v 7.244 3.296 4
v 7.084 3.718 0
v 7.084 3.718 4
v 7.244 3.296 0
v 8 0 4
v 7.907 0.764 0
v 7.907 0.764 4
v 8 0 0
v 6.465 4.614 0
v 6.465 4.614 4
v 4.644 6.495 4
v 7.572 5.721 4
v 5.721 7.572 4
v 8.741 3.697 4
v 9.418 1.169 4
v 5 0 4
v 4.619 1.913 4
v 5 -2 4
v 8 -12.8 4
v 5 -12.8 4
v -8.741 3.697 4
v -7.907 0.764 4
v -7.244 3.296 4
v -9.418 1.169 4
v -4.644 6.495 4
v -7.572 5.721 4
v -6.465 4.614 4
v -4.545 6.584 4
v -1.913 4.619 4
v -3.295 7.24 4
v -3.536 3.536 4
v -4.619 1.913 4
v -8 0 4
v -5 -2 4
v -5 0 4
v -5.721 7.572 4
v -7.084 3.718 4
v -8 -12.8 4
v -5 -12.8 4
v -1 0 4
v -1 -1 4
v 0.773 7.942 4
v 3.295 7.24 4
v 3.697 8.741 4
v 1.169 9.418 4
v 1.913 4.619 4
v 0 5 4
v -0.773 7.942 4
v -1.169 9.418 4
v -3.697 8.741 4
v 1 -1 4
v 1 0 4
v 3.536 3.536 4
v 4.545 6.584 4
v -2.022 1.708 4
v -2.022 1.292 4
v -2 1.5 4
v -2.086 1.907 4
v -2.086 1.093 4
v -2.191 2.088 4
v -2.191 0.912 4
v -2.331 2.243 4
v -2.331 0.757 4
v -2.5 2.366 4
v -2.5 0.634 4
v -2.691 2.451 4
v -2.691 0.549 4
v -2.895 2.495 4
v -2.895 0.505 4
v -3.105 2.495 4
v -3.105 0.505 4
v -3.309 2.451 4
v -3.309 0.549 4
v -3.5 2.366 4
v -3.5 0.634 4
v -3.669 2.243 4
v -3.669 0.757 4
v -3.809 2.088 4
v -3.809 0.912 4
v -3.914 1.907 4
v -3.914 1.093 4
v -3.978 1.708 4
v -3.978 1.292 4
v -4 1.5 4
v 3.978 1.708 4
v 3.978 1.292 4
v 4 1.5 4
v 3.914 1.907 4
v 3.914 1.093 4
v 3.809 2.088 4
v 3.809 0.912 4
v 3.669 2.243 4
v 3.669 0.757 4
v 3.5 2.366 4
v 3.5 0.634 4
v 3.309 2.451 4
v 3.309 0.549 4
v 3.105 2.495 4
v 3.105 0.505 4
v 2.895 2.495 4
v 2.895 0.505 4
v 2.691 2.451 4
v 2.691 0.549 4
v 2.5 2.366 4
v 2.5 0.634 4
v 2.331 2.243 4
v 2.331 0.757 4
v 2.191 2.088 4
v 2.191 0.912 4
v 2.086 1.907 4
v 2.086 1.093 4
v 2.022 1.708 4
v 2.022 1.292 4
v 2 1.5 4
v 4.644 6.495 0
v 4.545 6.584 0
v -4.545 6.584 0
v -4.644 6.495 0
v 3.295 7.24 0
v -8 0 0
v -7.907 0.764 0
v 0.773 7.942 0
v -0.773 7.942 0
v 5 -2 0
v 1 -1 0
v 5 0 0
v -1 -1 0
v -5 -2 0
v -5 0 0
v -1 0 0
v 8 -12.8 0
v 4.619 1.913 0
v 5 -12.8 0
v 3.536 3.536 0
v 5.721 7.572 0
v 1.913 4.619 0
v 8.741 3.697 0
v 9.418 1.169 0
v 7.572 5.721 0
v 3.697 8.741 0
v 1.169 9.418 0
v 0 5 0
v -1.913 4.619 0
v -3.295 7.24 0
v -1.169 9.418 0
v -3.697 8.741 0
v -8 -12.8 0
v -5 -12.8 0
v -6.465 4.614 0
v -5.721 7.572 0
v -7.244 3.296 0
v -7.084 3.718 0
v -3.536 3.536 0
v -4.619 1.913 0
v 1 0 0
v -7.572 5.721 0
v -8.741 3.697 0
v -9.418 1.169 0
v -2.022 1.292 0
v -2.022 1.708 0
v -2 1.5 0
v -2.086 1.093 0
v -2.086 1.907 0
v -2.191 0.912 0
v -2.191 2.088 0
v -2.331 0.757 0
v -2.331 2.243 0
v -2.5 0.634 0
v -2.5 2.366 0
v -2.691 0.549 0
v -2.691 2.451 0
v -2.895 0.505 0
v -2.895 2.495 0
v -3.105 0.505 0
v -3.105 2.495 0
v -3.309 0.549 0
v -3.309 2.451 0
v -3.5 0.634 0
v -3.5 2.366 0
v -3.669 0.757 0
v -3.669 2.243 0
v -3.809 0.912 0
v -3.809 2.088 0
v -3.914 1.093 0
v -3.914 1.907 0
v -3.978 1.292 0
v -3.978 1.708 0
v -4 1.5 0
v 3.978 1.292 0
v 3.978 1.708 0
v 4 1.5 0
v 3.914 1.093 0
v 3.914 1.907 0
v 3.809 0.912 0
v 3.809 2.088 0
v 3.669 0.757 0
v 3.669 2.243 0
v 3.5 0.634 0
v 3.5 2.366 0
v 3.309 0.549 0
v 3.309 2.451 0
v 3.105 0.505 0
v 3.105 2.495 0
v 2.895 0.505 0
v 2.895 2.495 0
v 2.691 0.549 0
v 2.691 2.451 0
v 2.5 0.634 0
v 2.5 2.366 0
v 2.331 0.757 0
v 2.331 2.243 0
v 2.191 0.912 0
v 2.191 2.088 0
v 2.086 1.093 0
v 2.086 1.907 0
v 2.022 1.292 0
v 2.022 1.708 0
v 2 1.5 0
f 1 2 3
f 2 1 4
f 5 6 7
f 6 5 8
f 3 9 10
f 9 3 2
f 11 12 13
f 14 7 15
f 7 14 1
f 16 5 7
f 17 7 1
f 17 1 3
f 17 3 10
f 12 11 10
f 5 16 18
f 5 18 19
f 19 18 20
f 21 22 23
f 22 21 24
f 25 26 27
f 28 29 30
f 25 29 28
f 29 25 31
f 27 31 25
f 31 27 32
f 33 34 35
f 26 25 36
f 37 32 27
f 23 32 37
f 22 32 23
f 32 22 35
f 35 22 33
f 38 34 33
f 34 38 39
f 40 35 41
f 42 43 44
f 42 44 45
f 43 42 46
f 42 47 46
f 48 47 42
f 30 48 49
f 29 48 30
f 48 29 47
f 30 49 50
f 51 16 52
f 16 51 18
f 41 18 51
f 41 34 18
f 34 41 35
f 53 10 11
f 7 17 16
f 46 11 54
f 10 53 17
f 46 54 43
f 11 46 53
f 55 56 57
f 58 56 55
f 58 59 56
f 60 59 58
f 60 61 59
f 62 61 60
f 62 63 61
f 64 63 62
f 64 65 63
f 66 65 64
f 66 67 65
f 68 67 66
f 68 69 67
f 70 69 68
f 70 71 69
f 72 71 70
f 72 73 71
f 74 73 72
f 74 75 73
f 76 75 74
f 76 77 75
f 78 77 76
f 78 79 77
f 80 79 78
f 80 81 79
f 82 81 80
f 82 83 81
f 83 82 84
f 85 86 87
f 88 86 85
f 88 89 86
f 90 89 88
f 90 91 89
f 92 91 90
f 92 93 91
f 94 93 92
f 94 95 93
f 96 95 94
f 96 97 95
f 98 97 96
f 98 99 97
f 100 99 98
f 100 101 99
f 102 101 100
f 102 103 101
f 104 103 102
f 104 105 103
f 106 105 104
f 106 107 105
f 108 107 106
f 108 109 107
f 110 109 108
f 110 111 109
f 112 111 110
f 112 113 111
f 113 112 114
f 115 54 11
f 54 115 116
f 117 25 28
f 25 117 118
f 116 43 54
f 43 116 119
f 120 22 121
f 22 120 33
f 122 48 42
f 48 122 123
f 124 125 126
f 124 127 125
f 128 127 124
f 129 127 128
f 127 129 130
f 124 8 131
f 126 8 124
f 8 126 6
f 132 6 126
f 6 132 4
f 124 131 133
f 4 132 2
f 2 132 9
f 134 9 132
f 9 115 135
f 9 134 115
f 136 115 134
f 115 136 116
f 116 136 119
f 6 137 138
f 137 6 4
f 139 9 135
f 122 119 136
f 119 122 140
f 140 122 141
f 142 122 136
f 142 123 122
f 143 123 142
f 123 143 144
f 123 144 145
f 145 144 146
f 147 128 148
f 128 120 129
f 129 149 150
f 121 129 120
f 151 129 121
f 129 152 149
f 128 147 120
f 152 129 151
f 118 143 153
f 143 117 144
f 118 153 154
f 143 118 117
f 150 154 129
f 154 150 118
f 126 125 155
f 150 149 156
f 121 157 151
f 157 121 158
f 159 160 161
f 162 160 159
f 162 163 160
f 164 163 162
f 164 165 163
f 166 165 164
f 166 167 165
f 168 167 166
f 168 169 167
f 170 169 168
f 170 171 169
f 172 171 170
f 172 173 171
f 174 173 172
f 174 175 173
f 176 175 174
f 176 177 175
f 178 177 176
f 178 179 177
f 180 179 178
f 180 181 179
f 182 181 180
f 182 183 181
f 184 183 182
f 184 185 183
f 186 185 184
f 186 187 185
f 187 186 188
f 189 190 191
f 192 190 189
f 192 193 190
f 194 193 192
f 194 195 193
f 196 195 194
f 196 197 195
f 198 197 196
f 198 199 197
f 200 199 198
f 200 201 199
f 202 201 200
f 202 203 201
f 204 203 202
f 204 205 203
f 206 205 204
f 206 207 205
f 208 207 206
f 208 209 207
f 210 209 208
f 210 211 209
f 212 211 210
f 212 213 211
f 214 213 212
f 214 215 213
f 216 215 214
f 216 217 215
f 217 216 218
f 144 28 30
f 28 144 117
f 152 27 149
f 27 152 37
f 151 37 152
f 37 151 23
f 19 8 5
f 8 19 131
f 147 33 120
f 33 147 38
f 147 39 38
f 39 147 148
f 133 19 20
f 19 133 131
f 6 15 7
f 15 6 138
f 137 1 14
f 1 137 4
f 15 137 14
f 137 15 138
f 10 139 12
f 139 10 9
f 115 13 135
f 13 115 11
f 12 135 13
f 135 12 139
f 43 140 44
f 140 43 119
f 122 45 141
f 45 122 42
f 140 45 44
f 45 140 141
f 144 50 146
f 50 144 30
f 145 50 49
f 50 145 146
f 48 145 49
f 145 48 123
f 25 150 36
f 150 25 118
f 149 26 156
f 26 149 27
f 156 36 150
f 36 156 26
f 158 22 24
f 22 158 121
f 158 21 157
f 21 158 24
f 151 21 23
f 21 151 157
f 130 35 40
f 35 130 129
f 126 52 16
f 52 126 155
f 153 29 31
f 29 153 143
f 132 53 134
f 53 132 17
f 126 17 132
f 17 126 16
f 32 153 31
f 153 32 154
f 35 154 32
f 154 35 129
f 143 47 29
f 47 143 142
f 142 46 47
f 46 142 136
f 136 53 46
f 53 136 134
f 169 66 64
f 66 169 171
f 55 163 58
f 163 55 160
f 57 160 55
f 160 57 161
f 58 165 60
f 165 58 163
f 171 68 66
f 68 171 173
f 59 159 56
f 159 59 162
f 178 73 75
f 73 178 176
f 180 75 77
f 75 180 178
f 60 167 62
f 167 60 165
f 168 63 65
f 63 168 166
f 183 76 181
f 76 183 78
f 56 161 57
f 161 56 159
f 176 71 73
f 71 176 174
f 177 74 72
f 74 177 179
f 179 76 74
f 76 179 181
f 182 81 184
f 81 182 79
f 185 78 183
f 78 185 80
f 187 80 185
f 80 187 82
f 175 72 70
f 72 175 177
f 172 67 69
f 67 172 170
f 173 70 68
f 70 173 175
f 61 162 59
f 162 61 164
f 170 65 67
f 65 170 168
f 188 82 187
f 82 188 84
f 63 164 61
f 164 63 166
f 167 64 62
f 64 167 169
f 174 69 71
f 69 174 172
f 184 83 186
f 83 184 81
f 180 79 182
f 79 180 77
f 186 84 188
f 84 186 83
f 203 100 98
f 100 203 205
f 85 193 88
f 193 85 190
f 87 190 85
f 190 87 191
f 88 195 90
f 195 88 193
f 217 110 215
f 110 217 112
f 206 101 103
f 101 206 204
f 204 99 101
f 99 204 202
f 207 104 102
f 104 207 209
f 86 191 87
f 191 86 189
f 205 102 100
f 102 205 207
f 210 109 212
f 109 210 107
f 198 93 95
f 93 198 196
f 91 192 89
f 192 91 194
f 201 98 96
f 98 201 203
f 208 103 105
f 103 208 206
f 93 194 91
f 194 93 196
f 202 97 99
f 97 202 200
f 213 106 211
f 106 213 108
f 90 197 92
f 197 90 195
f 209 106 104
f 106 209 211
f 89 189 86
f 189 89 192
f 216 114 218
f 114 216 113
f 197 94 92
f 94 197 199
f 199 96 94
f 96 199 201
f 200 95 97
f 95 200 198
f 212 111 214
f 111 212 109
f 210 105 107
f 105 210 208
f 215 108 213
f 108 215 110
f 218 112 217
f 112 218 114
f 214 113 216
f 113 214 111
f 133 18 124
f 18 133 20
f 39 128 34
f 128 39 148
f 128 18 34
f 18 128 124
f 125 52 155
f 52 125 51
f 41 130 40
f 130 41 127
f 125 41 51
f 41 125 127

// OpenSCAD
// TODO(cbiffle): factor constants into library.
PI = 3.14159265358;
EPSILON = 1;

/////////// Design parameters: edit if it looks wrong to you.
NUM_TEETH = 6;
// Ratios are in proportion to the logo's overall width.
TOOTH_RATIO = 0.1;
TOOTH_SIZE_RATIO = 0.07;
SIDE_RATIO = 0.15;
CHIN_RATIO = 0.2;
EYE_SIZE_RATIO = 0.05;
EYE_SPACING_RATIO = 0.15;

// Here's the logo!  Set size to taste.
module logo(width, height, depth) {
	 difference() {
		union() {
			_body_shape(width, height, depth);
			_gear_teeth(width, height, depth);
		}
		_hollow_bits(width, height, depth);
	}
}


module _body_shape(width, height, depth) {
	body_width = width * (1 - (2*TOOTH_RATIO));
	body_height = body_width * 0.8;

	union() {
		cylinder(r = body_width/2, h = depth);
		translate([-body_width/2, -body_height, 0])
			cube([body_width, body_height, depth]);
	}
}

module _gear_teeth(width, height, depth) {
	// Each tooth is centered in a 180/NUM_TEETH segment of arc.
	tooth_arc = 180/NUM_TEETH;
	body_width = width * (1 - (2*TOOTH_RATIO));
	head_half_circ = PI * body_width;
	tooth_arc_len = head_half_circ / NUM_TEETH;
	tooth_size = width * TOOTH_SIZE_RATIO;
	tooth_width = tooth_arc_len * 5/16;
	for (n = [0:(NUM_TEETH - 1)]) {
		rotate([0, 0, n * tooth_arc + tooth_arc/2 - 90])
			translate([-tooth_width/2, body_width/2 - 1, 0])
			cube([tooth_width, tooth_size + 1, depth]);		
	}
}

module _hollow_bits(width, height, depth) {
	body_width = width * (1 - (2*TOOTH_RATIO) - (2*SIDE_RATIO));
	chin_thickness = body_width * CHIN_RATIO;
	body_height = width * 0.8 * (1 - (2*TOOTH_RATIO)) - chin_thickness;

	// Body hollow
	translate([-body_width/2, -body_height - chin_thickness - EPSILON, -EPSILON])
		cube([body_width, body_height + EPSILON, depth + 2*EPSILON]);

	// Head hollow
	difference() {
		intersection() {
			translate([-width/2, 0, -EPSILON])
				cube([width, height, depth + 2*EPSILON]);
			translate([0, 0, -EPSILON])
				cylinder(r = body_width/2, h = depth + 2*EPSILON);
		}

		for (n = [-1, 1]) {
			translate([n * width * EYE_SPACING_RATIO,
			           1.5 * width * EYE_SIZE_RATIO,
			           -EPSILON])
				cylinder(r = width * EYE_SIZE_RATIO, h = depth + 2*EPSILON * 10, $fs=0.1);
		}
	}

	// Tooth
	translate([-chin_thickness/2, -chin_thickness/2, -EPSILON])
		cube([chin_thickness, chin_thickness/2 + EPSILON, depth + 2*EPSILON]);
}

logo(20, 28, 4);
